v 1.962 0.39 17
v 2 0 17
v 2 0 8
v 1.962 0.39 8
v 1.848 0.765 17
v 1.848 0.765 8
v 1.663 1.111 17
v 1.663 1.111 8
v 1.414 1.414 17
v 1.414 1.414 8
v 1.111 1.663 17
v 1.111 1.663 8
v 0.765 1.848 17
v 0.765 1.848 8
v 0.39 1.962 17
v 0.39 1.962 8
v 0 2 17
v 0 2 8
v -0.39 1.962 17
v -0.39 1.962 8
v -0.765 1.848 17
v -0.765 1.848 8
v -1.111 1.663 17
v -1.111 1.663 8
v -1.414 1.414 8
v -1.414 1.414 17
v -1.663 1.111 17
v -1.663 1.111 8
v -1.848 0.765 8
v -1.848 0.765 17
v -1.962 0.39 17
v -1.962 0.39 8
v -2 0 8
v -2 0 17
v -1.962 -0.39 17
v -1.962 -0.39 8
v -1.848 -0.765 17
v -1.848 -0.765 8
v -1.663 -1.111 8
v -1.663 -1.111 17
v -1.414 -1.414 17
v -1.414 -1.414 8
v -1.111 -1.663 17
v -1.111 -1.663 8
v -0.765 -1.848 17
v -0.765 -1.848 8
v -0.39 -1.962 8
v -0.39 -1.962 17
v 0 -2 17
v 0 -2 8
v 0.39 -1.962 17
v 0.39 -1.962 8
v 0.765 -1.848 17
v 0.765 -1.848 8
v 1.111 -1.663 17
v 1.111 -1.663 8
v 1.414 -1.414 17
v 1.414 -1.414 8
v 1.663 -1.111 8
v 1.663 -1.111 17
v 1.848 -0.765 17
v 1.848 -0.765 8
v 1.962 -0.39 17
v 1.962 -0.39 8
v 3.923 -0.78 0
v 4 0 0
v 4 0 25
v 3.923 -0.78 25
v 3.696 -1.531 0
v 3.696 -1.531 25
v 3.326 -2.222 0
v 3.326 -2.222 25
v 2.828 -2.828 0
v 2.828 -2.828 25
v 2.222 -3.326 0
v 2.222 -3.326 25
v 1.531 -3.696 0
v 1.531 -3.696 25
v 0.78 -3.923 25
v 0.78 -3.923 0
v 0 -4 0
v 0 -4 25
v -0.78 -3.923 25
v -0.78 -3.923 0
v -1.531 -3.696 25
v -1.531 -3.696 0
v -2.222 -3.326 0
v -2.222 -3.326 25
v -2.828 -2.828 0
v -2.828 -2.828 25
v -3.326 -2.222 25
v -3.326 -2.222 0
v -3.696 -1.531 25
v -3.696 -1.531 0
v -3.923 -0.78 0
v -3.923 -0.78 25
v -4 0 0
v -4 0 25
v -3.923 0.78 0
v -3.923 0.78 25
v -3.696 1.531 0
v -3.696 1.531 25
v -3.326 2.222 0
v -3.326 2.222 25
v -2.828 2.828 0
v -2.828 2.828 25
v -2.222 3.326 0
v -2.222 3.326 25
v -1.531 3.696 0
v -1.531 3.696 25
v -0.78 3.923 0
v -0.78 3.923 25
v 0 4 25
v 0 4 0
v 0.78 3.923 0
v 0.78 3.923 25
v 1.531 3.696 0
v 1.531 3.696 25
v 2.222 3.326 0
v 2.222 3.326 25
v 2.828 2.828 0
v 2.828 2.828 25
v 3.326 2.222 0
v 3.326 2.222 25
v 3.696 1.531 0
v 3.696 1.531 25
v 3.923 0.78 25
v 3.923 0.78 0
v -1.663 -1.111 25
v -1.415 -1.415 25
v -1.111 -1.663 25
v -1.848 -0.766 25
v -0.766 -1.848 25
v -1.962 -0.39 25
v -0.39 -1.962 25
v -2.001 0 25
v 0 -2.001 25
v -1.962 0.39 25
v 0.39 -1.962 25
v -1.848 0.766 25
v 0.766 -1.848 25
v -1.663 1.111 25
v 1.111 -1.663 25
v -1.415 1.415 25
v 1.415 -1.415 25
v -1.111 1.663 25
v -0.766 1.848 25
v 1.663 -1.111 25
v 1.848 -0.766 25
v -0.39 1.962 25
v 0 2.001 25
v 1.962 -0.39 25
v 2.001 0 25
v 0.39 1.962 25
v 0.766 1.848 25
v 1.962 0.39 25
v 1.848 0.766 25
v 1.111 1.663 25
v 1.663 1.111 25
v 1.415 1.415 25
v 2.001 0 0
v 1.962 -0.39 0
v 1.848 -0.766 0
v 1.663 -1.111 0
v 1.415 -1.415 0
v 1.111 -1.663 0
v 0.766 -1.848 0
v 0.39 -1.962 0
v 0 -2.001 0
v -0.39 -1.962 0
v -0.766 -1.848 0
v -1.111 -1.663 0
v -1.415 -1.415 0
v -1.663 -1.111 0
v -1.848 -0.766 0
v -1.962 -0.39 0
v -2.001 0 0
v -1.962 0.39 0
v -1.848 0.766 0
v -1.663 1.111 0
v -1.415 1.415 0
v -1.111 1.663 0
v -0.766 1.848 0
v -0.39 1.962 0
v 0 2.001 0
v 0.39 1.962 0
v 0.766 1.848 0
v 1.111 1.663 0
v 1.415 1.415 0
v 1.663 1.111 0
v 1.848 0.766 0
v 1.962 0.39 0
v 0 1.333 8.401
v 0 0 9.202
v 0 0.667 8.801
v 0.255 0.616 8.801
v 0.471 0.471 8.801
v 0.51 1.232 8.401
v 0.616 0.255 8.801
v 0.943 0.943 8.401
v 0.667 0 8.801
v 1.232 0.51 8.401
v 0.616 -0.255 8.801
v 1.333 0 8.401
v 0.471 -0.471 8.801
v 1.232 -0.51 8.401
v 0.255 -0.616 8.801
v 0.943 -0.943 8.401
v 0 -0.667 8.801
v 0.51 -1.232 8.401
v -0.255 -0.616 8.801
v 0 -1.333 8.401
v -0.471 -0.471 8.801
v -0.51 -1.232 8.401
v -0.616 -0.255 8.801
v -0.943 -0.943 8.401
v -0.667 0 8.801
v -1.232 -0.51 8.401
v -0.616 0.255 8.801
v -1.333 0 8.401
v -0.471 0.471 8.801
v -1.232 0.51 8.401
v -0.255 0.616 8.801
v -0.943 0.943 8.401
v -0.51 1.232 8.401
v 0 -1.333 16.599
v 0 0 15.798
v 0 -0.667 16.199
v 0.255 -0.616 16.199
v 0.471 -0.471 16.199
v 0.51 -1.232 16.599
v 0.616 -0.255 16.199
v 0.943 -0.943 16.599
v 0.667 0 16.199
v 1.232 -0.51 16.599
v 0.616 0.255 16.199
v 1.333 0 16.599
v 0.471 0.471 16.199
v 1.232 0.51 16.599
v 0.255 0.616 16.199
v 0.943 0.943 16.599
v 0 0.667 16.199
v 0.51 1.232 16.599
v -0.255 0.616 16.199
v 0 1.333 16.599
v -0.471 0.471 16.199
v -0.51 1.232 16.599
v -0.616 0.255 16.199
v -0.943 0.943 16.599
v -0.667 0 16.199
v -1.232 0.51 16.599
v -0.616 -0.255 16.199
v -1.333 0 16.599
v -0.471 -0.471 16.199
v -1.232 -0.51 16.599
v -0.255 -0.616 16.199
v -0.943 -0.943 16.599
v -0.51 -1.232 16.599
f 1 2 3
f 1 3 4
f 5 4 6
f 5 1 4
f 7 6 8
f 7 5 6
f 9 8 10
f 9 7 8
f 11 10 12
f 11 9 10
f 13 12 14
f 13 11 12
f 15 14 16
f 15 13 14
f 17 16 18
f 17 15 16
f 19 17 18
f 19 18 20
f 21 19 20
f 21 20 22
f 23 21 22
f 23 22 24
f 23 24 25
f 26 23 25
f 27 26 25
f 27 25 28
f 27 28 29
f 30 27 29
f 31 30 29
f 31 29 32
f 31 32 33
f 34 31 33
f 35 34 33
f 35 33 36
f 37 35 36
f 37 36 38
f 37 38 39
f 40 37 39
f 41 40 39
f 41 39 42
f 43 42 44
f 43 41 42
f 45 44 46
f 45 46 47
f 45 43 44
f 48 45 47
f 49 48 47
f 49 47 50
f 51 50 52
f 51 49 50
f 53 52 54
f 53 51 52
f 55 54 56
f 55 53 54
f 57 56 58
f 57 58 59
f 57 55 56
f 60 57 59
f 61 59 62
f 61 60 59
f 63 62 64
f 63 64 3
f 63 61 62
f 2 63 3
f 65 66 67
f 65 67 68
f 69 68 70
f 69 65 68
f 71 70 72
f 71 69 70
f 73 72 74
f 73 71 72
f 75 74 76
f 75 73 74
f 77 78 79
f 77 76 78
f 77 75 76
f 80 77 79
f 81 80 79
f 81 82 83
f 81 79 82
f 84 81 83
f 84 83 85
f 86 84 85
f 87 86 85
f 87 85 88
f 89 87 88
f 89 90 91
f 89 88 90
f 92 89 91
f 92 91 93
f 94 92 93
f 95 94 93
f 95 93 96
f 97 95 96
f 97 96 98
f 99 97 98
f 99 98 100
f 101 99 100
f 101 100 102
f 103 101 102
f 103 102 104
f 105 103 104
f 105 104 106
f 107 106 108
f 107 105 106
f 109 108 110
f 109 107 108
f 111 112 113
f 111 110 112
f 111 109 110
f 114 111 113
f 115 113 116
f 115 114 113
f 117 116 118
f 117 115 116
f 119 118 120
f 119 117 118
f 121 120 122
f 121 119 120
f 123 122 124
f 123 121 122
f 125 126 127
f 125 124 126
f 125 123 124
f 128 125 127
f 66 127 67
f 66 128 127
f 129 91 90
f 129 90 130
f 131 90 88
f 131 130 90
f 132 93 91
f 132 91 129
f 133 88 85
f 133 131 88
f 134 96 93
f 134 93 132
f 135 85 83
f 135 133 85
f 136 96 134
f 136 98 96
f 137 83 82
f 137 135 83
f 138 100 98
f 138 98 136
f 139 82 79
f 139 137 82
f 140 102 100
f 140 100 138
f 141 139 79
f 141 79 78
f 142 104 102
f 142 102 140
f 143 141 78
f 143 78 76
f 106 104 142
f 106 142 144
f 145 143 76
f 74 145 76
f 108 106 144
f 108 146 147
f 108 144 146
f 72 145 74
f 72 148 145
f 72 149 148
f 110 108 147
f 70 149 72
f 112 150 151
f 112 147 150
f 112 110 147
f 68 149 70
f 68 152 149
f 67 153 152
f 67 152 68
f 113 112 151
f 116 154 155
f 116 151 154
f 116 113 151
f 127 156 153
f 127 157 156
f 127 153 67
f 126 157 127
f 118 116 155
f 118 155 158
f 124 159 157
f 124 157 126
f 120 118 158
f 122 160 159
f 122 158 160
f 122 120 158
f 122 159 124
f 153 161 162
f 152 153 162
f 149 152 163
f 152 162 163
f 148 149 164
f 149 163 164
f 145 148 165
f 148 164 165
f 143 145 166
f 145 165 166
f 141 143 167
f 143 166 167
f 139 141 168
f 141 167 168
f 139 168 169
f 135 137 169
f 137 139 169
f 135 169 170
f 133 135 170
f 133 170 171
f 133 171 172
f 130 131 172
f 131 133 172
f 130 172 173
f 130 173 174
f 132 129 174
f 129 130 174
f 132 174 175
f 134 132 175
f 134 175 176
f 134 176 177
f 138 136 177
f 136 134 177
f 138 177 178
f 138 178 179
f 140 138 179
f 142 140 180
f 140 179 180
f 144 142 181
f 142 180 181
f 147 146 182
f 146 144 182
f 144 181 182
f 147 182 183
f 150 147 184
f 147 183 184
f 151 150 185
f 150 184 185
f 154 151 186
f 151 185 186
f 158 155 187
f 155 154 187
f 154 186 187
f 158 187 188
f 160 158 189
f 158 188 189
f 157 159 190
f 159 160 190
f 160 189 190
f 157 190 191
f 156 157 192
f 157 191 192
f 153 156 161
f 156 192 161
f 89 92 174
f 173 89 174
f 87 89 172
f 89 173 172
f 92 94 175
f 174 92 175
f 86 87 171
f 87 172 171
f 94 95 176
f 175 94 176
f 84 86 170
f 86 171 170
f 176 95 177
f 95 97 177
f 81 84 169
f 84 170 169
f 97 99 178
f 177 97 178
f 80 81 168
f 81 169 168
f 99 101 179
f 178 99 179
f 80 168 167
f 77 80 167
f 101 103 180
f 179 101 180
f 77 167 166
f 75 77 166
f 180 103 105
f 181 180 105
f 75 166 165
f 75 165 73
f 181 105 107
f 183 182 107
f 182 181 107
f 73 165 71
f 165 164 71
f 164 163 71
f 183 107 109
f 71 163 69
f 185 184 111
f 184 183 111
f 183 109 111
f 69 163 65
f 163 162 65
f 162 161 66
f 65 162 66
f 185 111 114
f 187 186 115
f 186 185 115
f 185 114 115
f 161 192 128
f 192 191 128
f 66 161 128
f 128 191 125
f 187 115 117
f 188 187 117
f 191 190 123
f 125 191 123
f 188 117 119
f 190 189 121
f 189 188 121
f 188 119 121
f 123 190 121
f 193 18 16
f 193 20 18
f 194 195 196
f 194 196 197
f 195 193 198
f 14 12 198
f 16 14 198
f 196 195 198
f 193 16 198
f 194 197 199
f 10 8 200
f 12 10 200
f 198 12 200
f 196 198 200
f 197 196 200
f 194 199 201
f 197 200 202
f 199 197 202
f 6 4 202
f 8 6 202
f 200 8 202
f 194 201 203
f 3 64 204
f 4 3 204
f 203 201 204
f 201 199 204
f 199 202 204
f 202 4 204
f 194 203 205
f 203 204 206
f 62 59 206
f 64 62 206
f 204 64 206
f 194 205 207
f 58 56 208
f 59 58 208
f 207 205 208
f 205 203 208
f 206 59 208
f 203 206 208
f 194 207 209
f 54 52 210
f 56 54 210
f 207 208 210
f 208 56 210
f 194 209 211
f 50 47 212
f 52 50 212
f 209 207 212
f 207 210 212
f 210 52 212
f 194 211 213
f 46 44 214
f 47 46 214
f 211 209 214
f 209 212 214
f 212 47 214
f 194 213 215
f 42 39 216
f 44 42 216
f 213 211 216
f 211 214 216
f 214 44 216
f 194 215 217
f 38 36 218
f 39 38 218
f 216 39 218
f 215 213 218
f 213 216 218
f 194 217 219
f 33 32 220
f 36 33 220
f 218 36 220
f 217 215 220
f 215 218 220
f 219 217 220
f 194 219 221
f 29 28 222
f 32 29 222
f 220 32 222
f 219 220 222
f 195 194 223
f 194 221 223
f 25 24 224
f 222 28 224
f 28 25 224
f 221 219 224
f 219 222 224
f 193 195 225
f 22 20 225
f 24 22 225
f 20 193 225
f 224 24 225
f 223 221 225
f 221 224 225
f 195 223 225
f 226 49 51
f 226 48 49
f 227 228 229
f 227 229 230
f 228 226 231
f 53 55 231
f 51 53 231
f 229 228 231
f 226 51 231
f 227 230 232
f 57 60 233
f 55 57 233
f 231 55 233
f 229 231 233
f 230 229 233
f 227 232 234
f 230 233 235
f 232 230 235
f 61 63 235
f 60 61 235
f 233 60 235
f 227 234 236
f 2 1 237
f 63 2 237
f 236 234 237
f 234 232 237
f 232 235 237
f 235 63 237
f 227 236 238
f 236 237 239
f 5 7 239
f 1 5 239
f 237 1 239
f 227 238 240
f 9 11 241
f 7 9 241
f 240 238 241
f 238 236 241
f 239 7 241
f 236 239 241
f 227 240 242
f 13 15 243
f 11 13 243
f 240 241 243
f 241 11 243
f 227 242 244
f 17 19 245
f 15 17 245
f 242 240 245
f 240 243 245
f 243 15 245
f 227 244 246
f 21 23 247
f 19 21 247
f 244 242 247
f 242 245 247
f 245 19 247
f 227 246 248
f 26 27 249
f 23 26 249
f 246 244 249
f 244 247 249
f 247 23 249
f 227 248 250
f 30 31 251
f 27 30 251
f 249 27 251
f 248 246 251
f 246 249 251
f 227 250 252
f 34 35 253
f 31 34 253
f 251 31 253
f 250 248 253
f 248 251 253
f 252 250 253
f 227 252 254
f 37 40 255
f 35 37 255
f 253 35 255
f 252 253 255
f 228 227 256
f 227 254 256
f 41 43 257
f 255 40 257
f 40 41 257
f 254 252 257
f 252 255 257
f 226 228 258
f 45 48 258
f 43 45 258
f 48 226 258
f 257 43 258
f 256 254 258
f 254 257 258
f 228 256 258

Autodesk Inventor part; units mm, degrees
ref_plane "YZ Plane" through (0, 0, 0) normal (1, 0, 0) x (0, 1, 0)
ref_plane "XZ Plane" through (0, 0, 0) normal (0, 1, 0) x (-1, 0, 0)
ref_plane "XY Plane" through (0, 0, 0) normal (0, 0, 1) x (1, 0, 0)
sketch "スケッチ1" plane through (0, 0, 0) normal (0, 0, 1) x (1, 0, 0)
  circle A0 centre (0, 0) radius 4
  circle A1 centre (0, 0) radius 2.0005
  dimension "d0" = 8
  dimension "d1" = 4.001
extrude "押し出し1" add sketch "スケッチ1" along normal blind 25
sketch "スケッチ2" plane through (0, 0, 25) normal (0, 0, 1) x (1, 0, 0)
  circle A0 centre (0, 0) radius 2
  dimension "d4" = 4
extrude "押し出し2" add sketch "スケッチ2" against normal blind 25
hole "穴1" at (0, 0, 25) direction (0, 0, -1) diameter 4 depth 8 tip angle 118
hole "穴2" at (0, 0, 0) direction (0, 0, 1) diameter 4 depth 8 tip angle 118
properties part number "スペーサーm4-25　簡易筒型" material "アルミニウム 2014-T4"
